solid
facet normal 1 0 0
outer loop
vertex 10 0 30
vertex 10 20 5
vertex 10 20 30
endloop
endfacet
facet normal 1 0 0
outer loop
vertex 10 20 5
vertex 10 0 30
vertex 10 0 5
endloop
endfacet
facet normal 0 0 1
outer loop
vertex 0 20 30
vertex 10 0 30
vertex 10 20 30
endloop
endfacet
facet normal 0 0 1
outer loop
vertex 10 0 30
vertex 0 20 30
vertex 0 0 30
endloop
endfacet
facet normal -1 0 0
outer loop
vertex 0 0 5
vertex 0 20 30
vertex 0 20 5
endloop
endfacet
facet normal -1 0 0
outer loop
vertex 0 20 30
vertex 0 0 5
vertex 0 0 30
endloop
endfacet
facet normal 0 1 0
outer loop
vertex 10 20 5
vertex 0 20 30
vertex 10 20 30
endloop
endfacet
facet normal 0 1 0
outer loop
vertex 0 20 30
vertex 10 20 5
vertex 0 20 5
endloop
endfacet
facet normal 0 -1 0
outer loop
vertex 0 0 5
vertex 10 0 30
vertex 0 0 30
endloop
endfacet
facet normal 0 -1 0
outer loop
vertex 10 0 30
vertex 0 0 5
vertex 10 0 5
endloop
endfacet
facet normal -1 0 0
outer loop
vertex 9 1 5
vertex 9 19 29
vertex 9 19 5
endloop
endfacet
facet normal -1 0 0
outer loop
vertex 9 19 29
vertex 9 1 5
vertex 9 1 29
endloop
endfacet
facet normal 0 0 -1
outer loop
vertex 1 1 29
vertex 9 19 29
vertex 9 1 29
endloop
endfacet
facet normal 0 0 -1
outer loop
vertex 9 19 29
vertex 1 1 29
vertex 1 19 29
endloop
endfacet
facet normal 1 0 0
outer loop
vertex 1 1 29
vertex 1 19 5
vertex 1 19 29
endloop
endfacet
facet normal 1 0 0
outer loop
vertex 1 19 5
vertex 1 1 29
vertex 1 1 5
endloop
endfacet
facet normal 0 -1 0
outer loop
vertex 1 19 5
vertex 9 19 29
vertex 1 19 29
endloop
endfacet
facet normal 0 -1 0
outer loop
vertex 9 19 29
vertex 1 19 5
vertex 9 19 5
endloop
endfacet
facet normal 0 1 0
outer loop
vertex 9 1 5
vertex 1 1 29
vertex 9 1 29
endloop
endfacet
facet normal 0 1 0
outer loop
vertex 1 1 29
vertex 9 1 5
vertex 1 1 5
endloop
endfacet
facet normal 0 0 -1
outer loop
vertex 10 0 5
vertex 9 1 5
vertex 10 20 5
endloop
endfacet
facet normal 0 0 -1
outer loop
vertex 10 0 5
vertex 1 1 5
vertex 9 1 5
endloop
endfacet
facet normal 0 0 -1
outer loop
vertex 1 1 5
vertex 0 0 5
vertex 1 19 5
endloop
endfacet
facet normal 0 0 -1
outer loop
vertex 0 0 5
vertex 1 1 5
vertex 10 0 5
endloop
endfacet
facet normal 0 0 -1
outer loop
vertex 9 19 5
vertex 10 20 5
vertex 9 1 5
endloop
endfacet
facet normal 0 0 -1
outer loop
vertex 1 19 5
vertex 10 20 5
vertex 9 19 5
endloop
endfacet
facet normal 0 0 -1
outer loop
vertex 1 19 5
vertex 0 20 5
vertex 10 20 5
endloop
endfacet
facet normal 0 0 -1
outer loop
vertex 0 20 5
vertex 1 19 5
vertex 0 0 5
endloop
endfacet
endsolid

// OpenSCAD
module box(size, thickness) {
	difference() {
		cube(size);

		translate([thickness, thickness, thickness])
		#cube(size - [thickness * 2, thickness * 2, thickness * 2]);
	}
}

difference() {

	box([10, 20, 30], 1);
	cube([100, 100, 5]);
}
